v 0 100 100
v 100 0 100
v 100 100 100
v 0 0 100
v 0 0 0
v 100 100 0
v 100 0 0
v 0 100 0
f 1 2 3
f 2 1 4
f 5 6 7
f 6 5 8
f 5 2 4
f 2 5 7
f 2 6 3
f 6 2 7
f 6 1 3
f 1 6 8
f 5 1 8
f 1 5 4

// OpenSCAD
a = echo("lib a") 1;
$fn = 50;
r = rands(0, 1, 1, 7)[0];
module lm() { echo("lm", a, $fn); sphere(); }
module lc() { echo("lc", $fn); children(); }
function lf() = [a, $fn];
function lclosure() = function() a * 10;
w = $fa;
function lw() = w;
cube(100);
echo("never printed");
